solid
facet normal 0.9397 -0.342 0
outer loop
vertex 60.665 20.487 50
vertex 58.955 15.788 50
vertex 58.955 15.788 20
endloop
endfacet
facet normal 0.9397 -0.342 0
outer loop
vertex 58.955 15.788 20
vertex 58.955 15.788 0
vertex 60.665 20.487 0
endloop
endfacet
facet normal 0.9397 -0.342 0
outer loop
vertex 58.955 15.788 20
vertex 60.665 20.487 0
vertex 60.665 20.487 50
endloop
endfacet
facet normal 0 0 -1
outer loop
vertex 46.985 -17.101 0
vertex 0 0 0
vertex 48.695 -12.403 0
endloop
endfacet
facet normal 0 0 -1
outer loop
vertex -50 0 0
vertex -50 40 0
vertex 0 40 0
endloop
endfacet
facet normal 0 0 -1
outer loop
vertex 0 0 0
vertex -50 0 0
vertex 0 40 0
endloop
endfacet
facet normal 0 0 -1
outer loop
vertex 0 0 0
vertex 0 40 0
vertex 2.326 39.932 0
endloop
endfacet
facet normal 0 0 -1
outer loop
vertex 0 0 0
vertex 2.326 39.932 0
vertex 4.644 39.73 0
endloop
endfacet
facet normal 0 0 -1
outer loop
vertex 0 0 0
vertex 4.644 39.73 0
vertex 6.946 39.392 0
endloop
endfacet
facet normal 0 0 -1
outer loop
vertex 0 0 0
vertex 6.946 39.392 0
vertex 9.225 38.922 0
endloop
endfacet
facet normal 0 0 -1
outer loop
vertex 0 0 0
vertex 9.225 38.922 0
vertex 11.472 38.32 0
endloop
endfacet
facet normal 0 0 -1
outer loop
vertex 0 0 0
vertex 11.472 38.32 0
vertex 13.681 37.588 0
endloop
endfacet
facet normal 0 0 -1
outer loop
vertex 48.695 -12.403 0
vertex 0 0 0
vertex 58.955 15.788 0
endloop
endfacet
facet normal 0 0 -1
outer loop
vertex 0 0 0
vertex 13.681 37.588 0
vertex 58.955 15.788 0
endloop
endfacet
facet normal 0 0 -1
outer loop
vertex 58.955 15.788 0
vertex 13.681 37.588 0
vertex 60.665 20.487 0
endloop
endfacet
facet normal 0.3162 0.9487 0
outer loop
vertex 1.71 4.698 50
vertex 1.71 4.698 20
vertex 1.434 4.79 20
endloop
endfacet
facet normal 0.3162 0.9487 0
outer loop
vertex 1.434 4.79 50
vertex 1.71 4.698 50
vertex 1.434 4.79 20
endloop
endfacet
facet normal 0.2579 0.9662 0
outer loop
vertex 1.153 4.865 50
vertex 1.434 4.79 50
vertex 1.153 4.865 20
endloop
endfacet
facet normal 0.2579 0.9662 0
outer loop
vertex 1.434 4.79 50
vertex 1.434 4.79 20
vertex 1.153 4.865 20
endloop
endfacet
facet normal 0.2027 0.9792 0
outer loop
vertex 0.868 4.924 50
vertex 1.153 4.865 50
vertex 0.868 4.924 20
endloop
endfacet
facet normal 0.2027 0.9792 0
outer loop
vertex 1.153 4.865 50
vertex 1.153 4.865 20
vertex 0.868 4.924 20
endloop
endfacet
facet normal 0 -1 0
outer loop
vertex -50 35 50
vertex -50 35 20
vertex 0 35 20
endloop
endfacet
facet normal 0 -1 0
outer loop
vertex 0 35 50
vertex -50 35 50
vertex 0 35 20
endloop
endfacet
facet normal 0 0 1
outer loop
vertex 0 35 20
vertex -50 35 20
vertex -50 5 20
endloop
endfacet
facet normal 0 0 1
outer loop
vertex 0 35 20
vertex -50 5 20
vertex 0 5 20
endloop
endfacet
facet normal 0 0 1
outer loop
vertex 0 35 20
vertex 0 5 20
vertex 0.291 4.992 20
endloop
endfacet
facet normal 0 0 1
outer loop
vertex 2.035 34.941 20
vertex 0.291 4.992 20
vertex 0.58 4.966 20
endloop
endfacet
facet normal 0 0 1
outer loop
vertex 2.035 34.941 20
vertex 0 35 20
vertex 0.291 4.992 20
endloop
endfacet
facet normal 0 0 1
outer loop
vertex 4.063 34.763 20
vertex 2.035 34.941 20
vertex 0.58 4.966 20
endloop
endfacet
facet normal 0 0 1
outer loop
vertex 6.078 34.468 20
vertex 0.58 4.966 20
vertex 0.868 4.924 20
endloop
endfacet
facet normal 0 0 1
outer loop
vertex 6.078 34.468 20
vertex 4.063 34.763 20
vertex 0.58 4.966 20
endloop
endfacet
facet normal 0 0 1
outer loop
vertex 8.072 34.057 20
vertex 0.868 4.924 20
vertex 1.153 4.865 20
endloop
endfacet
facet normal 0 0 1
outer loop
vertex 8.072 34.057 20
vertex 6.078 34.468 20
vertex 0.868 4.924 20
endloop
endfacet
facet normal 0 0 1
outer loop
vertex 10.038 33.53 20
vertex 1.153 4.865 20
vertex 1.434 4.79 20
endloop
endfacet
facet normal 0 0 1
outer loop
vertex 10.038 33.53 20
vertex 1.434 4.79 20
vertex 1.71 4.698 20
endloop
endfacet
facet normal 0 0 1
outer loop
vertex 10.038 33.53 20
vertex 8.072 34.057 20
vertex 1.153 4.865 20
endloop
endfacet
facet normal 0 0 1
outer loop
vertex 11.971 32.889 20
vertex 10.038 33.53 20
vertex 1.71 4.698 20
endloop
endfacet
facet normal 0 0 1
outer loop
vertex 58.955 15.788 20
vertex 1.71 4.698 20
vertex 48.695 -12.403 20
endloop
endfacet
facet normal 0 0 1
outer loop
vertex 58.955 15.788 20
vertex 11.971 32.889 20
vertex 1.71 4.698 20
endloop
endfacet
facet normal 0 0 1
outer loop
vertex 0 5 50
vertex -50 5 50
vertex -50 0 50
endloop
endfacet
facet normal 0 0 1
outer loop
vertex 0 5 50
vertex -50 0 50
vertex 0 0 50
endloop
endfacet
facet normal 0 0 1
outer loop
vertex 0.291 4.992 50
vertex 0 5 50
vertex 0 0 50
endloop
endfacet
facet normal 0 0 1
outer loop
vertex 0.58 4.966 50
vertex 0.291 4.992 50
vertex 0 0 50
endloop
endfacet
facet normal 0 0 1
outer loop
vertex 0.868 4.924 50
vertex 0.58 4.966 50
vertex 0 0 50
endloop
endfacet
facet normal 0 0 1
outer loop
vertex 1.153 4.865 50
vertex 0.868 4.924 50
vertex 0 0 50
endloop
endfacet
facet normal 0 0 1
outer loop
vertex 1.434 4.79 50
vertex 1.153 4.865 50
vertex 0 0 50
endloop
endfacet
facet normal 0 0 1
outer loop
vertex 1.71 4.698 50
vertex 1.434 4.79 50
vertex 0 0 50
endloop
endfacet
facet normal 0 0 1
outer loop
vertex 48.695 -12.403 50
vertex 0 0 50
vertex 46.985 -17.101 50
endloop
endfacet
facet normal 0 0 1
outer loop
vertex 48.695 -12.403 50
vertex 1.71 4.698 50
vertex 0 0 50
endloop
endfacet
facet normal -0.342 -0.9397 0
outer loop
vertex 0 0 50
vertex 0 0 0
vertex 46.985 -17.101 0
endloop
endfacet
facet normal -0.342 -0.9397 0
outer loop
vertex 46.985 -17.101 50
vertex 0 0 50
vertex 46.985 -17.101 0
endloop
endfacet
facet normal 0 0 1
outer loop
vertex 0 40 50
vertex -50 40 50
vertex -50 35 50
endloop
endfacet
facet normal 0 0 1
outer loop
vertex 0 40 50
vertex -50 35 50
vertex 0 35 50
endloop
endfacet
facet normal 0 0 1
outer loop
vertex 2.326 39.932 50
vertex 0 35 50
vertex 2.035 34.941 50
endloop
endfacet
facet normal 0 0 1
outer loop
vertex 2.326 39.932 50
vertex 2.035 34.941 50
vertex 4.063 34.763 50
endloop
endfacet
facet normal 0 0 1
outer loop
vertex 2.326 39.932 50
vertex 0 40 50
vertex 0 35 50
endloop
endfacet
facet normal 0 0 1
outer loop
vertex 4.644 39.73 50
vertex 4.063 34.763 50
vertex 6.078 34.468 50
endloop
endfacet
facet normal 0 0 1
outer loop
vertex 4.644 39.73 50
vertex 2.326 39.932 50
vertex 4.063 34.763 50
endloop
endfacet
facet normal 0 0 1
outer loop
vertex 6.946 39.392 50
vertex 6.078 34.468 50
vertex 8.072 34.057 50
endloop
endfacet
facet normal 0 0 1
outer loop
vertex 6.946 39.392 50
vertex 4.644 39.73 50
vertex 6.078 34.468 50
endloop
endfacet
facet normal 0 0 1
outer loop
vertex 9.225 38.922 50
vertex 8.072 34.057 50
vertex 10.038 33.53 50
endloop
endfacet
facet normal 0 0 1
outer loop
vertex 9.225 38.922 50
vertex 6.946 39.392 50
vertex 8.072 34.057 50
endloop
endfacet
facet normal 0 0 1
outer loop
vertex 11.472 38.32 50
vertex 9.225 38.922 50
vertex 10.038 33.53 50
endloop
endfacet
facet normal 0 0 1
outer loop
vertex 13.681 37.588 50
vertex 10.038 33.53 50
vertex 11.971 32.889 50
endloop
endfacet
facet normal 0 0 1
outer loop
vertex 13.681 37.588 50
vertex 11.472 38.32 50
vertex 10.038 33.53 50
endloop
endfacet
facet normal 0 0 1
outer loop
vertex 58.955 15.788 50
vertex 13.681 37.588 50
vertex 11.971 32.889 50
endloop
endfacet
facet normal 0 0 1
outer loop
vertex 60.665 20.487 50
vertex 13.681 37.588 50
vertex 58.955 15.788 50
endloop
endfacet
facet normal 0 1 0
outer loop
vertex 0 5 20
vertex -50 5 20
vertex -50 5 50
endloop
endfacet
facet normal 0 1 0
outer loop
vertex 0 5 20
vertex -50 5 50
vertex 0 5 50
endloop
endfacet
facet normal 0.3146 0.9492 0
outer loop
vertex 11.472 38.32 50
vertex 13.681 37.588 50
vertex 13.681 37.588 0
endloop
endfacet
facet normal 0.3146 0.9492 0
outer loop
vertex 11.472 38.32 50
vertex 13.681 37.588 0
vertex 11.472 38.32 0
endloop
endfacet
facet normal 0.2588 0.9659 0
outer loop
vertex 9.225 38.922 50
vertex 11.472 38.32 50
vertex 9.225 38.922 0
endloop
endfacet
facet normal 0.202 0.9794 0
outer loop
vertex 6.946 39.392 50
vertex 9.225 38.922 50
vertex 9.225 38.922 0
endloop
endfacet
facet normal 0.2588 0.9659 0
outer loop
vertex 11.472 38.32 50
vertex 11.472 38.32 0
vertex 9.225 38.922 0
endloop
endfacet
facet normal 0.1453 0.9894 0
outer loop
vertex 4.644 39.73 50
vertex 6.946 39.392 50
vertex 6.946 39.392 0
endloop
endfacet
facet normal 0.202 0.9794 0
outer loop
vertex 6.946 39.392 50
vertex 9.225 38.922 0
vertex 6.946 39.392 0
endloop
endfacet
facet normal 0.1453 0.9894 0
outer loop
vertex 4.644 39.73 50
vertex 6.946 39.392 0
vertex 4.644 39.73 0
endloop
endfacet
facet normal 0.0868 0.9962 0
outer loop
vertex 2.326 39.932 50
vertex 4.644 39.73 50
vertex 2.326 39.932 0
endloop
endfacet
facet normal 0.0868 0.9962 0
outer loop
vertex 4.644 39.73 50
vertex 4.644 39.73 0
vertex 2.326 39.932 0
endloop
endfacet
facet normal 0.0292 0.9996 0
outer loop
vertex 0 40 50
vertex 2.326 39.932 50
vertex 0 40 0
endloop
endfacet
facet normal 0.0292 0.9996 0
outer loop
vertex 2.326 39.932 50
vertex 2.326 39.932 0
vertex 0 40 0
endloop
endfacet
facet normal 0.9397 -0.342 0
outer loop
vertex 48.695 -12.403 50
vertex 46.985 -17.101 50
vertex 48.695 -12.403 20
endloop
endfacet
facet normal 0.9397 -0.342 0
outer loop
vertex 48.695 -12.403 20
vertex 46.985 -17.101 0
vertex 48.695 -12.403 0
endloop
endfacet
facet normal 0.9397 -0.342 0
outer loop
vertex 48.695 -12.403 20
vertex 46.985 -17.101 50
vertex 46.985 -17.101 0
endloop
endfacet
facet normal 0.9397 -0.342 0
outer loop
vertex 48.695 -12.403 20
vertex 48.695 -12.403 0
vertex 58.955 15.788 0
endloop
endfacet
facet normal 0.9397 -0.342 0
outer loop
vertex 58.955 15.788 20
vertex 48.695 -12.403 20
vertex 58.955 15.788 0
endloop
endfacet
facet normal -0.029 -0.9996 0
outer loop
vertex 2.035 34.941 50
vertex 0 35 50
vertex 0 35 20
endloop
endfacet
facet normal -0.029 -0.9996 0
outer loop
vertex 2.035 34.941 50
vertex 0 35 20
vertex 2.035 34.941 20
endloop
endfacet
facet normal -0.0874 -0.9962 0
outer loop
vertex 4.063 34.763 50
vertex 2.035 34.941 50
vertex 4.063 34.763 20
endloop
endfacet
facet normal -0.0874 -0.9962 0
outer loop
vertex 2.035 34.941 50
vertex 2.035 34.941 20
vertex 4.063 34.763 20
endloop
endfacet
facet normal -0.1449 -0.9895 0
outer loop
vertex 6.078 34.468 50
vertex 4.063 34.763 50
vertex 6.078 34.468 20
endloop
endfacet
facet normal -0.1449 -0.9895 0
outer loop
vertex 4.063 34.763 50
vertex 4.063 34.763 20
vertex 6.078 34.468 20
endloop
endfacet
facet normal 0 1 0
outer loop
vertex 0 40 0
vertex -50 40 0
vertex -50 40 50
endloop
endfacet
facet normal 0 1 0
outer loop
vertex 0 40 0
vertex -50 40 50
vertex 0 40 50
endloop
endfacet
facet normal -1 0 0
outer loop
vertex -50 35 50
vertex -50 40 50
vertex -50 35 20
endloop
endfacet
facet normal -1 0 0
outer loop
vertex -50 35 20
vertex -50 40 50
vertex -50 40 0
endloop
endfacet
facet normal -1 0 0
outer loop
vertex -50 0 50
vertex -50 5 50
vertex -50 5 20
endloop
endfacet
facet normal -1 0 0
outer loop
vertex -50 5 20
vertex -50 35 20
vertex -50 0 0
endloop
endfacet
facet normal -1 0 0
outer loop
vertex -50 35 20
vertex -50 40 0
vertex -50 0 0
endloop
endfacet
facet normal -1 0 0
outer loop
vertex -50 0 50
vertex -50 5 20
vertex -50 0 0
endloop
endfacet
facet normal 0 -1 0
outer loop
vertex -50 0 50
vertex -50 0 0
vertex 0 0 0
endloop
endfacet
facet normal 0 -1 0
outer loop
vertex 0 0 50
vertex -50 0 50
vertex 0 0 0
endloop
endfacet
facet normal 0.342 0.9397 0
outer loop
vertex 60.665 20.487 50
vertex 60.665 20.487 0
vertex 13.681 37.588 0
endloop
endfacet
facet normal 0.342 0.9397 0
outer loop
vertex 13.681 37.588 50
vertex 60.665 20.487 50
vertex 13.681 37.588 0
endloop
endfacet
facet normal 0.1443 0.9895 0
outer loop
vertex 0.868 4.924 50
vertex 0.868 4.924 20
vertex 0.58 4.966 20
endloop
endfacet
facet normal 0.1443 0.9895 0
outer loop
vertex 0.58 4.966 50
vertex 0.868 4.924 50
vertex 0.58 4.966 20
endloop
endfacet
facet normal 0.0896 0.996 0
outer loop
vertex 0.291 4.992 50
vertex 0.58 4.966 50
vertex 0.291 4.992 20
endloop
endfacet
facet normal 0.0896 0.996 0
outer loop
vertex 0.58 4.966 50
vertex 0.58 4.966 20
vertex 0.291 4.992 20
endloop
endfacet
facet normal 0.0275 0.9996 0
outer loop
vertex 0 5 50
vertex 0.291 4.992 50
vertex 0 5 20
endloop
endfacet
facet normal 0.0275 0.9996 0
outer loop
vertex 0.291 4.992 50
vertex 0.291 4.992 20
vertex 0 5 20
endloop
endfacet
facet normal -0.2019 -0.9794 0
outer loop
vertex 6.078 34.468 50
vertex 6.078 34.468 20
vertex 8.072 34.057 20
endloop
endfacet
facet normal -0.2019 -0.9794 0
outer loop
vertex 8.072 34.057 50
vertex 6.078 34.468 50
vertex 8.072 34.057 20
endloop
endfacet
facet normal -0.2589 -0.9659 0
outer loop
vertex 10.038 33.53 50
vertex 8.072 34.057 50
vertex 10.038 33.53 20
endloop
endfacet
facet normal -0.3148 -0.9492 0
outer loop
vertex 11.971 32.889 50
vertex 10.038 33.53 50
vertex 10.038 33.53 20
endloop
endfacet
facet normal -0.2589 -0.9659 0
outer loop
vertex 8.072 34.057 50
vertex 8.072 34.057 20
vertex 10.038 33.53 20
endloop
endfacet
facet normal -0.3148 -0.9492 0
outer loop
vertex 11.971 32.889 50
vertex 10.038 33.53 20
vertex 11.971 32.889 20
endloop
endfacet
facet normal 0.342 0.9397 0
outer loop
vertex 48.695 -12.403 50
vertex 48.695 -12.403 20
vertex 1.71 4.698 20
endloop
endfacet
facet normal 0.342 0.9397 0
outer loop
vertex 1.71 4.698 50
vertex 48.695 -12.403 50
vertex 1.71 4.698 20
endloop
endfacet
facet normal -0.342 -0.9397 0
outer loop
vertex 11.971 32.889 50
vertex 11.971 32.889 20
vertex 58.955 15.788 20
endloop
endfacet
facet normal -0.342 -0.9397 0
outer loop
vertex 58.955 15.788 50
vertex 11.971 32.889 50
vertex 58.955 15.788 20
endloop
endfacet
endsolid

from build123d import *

# Parameters (mm, degrees)
F0_W     = 50
F0_H     = 29.9999964237
F0_H_2   = 5.0000035763
F0_H_3   = 5
F1_DEPTH = 20
F2_DEPTH = 50


with BuildPart() as f1:
    # F0 (on Top) → F1 (new body)
    with BuildSketch(Plane.XY):
        with Locations((-25, 19.9999982119)):
            Rectangle(F0_W, F0_H)
        with Locations((-25, 37.4999982119)):
            Rectangle(F0_W, F0_H_2)
        with Locations((-25, 2.5)):
            Rectangle(F0_W, F0_H_3)
        with BuildLine():
            Line((0, 34.9999964237), (0, 5))
            ThreePointArc((0, 5), (0.4357787137, 4.9809734905), (0.8682408883, 4.9240387651))
            Line((0.8682408883, 4.9240387651), (6.0776855973, 34.4682678335))
            ThreePointArc((6.0776855973, 34.4682678335), (3.0504506845, 34.8668108705), (0, 34.9999964237))
        make_face()
        with BuildLine():
            Line((6.0776855973, 34.4682678335), (0.8682408883, 4.9240387651))
            ThreePointArc((0.8682408883, 4.9240387651), (1.2940952255, 4.8296291314), (1.7101007166, 4.6984631039))
            Line((1.7101007166, 4.6984631039), (11.9707037932, 32.8892383669))
            ThreePointArc((11.9707037932, 32.8892383669), (9.058665653, 33.8074004657), (6.0776855973, 34.4682678335))
        make_face()
        with BuildLine():
            Line((6.9459271067, 39.3923101205), (6.0776855973, 34.4682678335))
            ThreePointArc((6.0776855973, 34.4682678335), (9.058665653, 33.8074004657), (11.9707037932, 32.8892383669))
            Line((11.9707037932, 32.8892383669), (13.680805733, 37.5877048314))
            ThreePointArc((13.680805733, 37.5877048314), (10.3527618041, 38.6370330516), (6.9459271067, 39.3923101205))
        make_face()
        with BuildLine():
            Line((0, 40), (0, 34.9999964237))
            ThreePointArc((0, 34.9999964237), (3.0504506845, 34.8668108705), (6.0776855973, 34.4682678335))
            Line((6.0776855973, 34.4682678335), (6.9459271067, 39.3923101205))
            ThreePointArc((6.9459271067, 39.3923101205), (3.4862297099, 39.8477879237), (0, 40))
        make_face()
        with BuildLine():
            Line((0, 5), (0, 0))
            Line((0, 0), (0.8682408883, 4.9240387651))
            ThreePointArc((0.8682408883, 4.9240387651), (0.4357787137, 4.9809734905), (0, 5))
        make_face()
        with BuildLine():
            Line((0.8682408883, 4.9240387651), (0, 0))
            Line((0, 0), (1.7101007166, 4.6984631039))
            ThreePointArc((1.7101007166, 4.6984631039), (1.2940952255, 4.8296291314), (0.8682408883, 4.9240387651))
        make_face()
        Polygon((1.7101007166, 4.6984631039), (0, 0), (46.9846310393, -17.1010071663), (48.6947317559, -12.4025440624), align=None)
        Polygon((11.9707037932, 32.8892383669), (1.7101007166, 4.6984631039), (48.6947317559, -12.4025440624), (58.9553348325, 15.7882312006), align=None)
        Polygon((13.680805733, 37.5877048314), (11.9707037932, 32.8892383669), (58.9553348325, 15.7882312006), (60.6654367723, 20.4866976652), align=None)
    extrude(amount=F1_DEPTH)

    # F0 (on Top) → F2 (join)
    with BuildSketch(Plane.XY):
        with BuildLine():
            Line((6.9459271067, 39.3923101205), (6.0776855973, 34.4682678335))
            ThreePointArc((6.0776855973, 34.4682678335), (9.058665653, 33.8074004657), (11.9707037932, 32.8892383669))
            Line((11.9707037932, 32.8892383669), (13.680805733, 37.5877048314))
            ThreePointArc((13.680805733, 37.5877048314), (10.3527618041, 38.6370330516), (6.9459271067, 39.3923101205))
        make_face()
        Polygon((13.680805733, 37.5877048314), (11.9707037932, 32.8892383669), (58.9553348325, 15.7882312006), (60.6654367723, 20.4866976652), align=None)
        with BuildLine():
            Line((0, 40), (0, 34.9999964237))
            ThreePointArc((0, 34.9999964237), (3.0504506845, 34.8668108705), (6.0776855973, 34.4682678335))
            Line((6.0776855973, 34.4682678335), (6.9459271067, 39.3923101205))
            ThreePointArc((6.9459271067, 39.3923101205), (3.4862297099, 39.8477879237), (0, 40))
        make_face()
        with Locations((-25, 37.4999982119)):
            Rectangle(F0_W, F0_H_2)
        Polygon((1.7101007166, 4.6984631039), (0, 0), (46.9846310393, -17.1010071663), (48.6947317559, -12.4025440624), align=None)
        with Locations((-25, 2.5)):
            Rectangle(F0_W, F0_H_3)
        with BuildLine():
            Line((0, 5), (0, 0))
            Line((0, 0), (0.8682408883, 4.9240387651))
            ThreePointArc((0.8682408883, 4.9240387651), (0.4357787137, 4.9809734905), (0, 5))
        make_face()
        with BuildLine():
            Line((0.8682408883, 4.9240387651), (0, 0))
            Line((0, 0), (1.7101007166, 4.6984631039))
            ThreePointArc((1.7101007166, 4.6984631039), (1.2940952255, 4.8296291314), (0.8682408883, 4.9240387651))
        make_face()
    extrude(amount=F2_DEPTH)


solid = f1.part
